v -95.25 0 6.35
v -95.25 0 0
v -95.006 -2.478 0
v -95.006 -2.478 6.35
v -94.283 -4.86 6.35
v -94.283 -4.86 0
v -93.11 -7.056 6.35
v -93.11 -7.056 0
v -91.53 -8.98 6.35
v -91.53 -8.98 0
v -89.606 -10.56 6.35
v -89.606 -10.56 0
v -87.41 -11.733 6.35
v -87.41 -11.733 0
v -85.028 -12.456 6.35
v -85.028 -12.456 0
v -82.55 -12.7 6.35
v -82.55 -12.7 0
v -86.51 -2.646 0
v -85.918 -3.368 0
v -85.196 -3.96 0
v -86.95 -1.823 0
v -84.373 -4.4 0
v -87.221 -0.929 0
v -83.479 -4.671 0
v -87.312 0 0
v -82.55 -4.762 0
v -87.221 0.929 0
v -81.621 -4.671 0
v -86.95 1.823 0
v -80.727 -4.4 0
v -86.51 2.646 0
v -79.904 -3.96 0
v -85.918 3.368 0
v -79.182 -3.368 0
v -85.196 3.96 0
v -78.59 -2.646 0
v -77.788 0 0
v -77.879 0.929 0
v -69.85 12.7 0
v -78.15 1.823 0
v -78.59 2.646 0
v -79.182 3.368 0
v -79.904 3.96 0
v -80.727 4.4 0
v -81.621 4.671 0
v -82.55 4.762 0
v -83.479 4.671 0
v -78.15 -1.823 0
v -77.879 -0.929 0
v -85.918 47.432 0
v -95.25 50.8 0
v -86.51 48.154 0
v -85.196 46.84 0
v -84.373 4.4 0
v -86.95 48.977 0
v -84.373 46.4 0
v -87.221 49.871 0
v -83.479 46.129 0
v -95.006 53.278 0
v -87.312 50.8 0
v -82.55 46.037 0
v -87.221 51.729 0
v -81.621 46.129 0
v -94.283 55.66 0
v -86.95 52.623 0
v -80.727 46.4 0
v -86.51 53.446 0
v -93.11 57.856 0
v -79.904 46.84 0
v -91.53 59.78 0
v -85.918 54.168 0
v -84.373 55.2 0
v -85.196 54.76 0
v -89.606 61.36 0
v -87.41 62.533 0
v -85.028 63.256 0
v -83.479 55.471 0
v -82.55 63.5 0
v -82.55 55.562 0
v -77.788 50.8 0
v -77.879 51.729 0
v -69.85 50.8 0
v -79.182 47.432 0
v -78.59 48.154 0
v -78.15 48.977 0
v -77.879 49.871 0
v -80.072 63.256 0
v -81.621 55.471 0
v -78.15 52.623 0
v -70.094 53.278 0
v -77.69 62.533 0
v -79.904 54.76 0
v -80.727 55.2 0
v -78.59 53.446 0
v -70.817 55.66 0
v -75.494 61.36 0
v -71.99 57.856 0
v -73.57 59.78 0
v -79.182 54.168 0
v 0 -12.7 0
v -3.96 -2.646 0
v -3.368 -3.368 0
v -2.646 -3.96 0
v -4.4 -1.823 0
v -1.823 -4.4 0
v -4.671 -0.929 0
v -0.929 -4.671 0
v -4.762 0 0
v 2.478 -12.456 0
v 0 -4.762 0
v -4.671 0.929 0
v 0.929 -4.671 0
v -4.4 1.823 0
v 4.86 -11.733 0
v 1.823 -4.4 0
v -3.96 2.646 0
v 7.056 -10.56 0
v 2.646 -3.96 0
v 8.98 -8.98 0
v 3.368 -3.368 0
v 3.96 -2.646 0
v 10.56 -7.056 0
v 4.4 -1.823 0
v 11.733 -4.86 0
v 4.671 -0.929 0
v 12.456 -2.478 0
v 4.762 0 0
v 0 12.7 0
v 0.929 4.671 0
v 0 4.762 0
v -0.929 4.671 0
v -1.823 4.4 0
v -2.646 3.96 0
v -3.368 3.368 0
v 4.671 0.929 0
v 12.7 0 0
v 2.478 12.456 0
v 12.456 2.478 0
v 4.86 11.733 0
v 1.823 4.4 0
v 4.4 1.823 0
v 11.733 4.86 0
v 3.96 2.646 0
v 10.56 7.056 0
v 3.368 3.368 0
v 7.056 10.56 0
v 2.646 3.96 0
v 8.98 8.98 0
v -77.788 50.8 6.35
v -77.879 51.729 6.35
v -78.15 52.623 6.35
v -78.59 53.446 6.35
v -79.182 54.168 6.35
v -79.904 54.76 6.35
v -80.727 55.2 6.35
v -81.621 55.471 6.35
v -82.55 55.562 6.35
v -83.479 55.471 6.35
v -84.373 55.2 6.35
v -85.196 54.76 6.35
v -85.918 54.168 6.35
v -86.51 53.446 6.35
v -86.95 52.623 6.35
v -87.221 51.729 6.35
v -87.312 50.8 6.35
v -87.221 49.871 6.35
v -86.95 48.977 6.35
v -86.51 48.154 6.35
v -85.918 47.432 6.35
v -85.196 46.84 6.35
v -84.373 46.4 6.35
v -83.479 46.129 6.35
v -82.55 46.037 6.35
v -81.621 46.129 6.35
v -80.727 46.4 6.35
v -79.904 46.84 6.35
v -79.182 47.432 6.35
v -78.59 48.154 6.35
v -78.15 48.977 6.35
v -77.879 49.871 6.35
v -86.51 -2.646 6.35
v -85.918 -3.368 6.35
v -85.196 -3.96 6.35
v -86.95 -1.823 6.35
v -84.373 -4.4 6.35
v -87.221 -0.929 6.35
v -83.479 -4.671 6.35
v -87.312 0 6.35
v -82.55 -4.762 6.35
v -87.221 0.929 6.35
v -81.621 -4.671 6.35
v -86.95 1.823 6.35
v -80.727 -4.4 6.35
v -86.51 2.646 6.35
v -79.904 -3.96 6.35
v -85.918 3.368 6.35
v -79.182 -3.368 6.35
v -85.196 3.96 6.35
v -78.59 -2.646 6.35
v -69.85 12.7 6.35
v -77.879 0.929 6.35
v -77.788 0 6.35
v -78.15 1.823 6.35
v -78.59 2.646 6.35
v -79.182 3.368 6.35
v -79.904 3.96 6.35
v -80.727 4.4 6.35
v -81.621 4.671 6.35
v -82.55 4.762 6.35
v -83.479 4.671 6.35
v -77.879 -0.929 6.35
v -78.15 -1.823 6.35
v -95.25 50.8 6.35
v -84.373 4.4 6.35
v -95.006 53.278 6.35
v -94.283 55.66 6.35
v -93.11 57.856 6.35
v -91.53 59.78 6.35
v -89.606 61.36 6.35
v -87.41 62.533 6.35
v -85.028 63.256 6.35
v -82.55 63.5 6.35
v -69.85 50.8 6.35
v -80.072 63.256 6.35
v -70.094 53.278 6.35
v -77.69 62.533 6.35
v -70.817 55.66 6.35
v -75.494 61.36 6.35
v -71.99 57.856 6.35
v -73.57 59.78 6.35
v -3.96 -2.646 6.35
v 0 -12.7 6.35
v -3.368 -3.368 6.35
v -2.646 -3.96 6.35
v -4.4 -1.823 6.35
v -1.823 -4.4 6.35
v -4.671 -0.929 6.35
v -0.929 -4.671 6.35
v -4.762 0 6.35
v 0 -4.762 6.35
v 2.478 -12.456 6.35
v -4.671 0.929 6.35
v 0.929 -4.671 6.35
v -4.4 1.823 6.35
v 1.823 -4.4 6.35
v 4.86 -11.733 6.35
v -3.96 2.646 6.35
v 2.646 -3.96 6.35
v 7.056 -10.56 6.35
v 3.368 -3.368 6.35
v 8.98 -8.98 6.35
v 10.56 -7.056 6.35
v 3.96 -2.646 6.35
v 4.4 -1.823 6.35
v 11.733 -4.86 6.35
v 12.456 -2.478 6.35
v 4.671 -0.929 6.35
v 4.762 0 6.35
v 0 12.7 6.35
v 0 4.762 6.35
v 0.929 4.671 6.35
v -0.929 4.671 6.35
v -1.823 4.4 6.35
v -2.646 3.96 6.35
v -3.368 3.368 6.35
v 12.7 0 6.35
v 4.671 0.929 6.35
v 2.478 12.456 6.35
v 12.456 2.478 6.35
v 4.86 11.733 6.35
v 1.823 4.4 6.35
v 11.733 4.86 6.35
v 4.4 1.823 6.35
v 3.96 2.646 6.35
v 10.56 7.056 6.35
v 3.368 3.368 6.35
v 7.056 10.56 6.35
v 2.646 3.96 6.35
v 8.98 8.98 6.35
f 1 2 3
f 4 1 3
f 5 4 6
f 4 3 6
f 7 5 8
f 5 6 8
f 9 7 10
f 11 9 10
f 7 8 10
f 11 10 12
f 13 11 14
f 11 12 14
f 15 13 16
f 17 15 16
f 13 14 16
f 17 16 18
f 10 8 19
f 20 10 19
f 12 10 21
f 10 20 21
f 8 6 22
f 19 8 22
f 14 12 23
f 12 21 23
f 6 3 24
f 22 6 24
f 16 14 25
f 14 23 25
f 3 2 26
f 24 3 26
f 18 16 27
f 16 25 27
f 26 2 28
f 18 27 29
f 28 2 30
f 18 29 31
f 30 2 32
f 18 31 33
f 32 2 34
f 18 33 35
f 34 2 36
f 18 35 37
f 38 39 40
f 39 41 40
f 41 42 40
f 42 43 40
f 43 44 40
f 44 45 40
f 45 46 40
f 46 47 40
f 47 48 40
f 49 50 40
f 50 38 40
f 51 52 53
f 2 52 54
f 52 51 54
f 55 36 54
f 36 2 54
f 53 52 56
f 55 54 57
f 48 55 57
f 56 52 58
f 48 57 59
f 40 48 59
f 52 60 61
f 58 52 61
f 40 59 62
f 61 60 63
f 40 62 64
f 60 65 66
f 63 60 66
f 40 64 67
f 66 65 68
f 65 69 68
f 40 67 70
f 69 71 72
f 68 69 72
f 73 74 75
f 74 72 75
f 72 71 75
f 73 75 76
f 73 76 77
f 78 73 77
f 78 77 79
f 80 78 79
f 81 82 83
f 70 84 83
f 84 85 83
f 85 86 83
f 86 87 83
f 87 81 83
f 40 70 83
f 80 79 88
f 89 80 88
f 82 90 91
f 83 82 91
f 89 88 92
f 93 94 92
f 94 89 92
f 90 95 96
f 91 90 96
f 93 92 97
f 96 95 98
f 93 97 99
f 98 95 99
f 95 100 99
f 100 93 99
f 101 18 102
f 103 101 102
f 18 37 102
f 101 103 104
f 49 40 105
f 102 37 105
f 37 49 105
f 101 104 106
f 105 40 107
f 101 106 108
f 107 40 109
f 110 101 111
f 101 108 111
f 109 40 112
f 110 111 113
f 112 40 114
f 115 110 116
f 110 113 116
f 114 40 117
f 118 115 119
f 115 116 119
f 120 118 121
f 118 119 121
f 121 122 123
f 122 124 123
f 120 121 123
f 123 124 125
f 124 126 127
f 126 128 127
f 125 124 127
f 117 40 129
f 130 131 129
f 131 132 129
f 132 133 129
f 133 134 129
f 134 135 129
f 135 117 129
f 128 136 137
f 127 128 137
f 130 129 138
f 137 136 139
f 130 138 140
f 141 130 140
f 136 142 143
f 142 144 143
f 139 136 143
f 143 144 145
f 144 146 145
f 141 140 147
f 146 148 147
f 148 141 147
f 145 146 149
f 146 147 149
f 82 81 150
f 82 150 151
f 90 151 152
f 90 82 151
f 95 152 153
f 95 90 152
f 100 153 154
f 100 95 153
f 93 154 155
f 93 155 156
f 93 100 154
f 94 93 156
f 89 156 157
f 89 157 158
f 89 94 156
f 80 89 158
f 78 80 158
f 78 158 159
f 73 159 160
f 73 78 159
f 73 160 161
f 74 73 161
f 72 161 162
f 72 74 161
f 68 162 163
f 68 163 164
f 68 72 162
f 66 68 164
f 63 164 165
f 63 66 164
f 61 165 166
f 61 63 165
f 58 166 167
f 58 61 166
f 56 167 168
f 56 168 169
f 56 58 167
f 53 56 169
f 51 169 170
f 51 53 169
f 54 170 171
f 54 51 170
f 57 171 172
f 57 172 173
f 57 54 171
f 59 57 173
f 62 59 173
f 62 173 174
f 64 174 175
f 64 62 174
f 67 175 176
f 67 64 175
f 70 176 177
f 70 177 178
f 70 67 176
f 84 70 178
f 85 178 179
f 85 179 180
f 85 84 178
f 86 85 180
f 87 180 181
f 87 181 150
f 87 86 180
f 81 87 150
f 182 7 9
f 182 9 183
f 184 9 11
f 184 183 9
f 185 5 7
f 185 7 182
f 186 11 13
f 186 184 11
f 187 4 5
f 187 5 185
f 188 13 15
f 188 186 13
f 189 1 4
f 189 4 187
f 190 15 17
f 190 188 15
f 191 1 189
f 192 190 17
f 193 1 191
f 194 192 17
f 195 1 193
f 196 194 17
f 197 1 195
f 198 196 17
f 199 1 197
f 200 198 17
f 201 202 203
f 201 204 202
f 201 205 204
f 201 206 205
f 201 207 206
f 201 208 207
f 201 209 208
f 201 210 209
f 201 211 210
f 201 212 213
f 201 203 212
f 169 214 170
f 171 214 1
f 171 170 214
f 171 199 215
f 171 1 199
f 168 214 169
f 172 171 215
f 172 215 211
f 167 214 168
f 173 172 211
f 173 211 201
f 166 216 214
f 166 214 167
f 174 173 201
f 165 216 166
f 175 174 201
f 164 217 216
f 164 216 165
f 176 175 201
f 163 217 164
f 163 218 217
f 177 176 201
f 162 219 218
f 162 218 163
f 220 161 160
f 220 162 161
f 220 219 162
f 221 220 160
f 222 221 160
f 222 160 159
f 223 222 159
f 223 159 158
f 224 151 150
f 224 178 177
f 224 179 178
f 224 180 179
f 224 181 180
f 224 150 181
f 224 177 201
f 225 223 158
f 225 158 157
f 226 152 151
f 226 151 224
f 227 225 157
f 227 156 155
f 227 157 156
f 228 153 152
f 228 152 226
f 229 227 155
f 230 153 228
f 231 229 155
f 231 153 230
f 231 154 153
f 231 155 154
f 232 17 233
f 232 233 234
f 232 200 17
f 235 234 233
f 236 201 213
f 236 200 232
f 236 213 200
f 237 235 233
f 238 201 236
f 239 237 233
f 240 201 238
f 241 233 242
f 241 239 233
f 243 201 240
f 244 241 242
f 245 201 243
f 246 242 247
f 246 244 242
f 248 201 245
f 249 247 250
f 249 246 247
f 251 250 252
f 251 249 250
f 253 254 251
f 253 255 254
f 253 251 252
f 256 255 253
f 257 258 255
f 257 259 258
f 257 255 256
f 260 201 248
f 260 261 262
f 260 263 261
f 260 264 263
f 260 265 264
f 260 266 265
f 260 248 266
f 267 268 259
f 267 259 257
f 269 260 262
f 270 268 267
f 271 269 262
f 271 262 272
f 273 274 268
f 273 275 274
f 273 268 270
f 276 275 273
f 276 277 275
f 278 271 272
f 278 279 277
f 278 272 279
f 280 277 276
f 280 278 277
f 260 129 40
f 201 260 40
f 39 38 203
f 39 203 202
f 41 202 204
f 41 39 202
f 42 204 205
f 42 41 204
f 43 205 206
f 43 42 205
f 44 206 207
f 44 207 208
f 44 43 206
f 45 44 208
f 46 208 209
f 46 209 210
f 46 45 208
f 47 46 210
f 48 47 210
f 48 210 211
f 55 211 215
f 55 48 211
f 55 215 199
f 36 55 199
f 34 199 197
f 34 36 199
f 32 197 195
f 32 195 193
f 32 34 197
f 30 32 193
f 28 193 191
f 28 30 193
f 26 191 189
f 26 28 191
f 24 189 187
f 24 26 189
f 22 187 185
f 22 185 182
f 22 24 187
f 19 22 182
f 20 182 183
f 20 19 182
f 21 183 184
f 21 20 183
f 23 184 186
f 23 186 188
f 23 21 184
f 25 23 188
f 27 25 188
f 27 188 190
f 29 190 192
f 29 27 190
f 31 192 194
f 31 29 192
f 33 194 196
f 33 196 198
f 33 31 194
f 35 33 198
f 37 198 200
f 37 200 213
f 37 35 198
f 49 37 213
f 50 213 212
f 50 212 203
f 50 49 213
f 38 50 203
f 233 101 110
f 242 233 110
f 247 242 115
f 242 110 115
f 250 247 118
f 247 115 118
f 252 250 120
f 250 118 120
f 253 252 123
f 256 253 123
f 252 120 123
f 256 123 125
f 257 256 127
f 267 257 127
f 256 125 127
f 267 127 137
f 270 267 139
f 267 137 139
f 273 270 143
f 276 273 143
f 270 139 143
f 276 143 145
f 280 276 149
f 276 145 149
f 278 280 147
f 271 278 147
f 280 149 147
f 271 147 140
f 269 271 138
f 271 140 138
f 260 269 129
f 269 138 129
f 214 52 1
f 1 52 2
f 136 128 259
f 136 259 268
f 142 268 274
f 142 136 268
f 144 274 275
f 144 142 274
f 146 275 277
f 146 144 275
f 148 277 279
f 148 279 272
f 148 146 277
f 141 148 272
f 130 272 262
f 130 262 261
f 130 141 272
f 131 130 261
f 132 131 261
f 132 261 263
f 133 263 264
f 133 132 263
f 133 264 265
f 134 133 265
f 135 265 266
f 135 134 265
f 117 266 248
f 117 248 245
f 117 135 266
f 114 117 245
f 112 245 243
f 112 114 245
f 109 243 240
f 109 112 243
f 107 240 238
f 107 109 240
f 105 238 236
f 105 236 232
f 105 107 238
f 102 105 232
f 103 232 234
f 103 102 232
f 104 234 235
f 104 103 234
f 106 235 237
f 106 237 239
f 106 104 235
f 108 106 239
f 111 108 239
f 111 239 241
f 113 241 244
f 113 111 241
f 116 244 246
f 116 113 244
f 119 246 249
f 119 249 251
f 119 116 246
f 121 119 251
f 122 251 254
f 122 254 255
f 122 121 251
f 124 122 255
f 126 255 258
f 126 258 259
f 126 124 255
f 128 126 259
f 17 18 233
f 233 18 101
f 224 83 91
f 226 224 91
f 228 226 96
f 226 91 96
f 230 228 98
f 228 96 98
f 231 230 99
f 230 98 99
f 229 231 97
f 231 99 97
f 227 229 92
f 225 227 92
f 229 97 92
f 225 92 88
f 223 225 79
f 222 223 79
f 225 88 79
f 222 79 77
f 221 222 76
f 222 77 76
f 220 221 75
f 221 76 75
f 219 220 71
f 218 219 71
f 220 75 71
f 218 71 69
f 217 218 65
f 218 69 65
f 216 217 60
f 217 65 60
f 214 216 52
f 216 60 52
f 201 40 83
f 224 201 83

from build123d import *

# Parameters (mm, degrees)
SKETCH1_R           = 4.7625
BOSS_EXTRUDE1_DEPTH = 6.35


with BuildPart() as part:
    # Sketch1 → Boss-Extrude1 (new body)
    with BuildSketch(Plane.XY):
        with BuildLine():
            Line((-95.25, 50.8), (-95.25, 0))
            ThreePointArc((-95.25, 0), (-91.530256121, 8.980256121), (-82.55, 12.7))
            Line((-82.55, 12.7), (-69.85, 12.7))
            Line((-69.85, 12.7), (-69.85, 50.8))
            ThreePointArc((-69.85, 50.8), (-82.55, 63.5), (-95.25, 50.8))
        make_face()
        with Locations((-82.55, 50.8)):
            Circle(SKETCH1_R, mode=Mode.SUBTRACT)
        with BuildLine():
            ThreePointArc((-95.25, 0), (-91.530256121, -8.980256121), (-82.55, -12.7))
            ThreePointArc((-82.55, -12.7), (-73.569743879, -8.980256121), (-69.85, 0))
            Line((-69.85, 0), (-69.85, 12.7))
            Line((-69.85, 12.7), (-82.55, 12.7))
            ThreePointArc((-82.55, 12.7), (-91.530256121, 8.980256121), (-95.25, 0))
        make_face()
        with Locations((-82.55, 0)):
            Circle(SKETCH1_R, mode=Mode.SUBTRACT)
        with BuildLine():
            Line((-82.55, -12.7), (0, -12.7))
            ThreePointArc((0, -12.7), (12.7, 0), (0, 12.7))
            Line((0, 12.7), (-69.85, 12.7))
            Line((-69.85, 12.7), (-69.85, 0))
            ThreePointArc((-69.85, 0), (-73.569743879, -8.980256121), (-82.55, -12.7))
        make_face()
        Circle(SKETCH1_R, mode=Mode.SUBTRACT)
    extrude(amount=BOSS_EXTRUDE1_DEPTH)


solid = part.part
